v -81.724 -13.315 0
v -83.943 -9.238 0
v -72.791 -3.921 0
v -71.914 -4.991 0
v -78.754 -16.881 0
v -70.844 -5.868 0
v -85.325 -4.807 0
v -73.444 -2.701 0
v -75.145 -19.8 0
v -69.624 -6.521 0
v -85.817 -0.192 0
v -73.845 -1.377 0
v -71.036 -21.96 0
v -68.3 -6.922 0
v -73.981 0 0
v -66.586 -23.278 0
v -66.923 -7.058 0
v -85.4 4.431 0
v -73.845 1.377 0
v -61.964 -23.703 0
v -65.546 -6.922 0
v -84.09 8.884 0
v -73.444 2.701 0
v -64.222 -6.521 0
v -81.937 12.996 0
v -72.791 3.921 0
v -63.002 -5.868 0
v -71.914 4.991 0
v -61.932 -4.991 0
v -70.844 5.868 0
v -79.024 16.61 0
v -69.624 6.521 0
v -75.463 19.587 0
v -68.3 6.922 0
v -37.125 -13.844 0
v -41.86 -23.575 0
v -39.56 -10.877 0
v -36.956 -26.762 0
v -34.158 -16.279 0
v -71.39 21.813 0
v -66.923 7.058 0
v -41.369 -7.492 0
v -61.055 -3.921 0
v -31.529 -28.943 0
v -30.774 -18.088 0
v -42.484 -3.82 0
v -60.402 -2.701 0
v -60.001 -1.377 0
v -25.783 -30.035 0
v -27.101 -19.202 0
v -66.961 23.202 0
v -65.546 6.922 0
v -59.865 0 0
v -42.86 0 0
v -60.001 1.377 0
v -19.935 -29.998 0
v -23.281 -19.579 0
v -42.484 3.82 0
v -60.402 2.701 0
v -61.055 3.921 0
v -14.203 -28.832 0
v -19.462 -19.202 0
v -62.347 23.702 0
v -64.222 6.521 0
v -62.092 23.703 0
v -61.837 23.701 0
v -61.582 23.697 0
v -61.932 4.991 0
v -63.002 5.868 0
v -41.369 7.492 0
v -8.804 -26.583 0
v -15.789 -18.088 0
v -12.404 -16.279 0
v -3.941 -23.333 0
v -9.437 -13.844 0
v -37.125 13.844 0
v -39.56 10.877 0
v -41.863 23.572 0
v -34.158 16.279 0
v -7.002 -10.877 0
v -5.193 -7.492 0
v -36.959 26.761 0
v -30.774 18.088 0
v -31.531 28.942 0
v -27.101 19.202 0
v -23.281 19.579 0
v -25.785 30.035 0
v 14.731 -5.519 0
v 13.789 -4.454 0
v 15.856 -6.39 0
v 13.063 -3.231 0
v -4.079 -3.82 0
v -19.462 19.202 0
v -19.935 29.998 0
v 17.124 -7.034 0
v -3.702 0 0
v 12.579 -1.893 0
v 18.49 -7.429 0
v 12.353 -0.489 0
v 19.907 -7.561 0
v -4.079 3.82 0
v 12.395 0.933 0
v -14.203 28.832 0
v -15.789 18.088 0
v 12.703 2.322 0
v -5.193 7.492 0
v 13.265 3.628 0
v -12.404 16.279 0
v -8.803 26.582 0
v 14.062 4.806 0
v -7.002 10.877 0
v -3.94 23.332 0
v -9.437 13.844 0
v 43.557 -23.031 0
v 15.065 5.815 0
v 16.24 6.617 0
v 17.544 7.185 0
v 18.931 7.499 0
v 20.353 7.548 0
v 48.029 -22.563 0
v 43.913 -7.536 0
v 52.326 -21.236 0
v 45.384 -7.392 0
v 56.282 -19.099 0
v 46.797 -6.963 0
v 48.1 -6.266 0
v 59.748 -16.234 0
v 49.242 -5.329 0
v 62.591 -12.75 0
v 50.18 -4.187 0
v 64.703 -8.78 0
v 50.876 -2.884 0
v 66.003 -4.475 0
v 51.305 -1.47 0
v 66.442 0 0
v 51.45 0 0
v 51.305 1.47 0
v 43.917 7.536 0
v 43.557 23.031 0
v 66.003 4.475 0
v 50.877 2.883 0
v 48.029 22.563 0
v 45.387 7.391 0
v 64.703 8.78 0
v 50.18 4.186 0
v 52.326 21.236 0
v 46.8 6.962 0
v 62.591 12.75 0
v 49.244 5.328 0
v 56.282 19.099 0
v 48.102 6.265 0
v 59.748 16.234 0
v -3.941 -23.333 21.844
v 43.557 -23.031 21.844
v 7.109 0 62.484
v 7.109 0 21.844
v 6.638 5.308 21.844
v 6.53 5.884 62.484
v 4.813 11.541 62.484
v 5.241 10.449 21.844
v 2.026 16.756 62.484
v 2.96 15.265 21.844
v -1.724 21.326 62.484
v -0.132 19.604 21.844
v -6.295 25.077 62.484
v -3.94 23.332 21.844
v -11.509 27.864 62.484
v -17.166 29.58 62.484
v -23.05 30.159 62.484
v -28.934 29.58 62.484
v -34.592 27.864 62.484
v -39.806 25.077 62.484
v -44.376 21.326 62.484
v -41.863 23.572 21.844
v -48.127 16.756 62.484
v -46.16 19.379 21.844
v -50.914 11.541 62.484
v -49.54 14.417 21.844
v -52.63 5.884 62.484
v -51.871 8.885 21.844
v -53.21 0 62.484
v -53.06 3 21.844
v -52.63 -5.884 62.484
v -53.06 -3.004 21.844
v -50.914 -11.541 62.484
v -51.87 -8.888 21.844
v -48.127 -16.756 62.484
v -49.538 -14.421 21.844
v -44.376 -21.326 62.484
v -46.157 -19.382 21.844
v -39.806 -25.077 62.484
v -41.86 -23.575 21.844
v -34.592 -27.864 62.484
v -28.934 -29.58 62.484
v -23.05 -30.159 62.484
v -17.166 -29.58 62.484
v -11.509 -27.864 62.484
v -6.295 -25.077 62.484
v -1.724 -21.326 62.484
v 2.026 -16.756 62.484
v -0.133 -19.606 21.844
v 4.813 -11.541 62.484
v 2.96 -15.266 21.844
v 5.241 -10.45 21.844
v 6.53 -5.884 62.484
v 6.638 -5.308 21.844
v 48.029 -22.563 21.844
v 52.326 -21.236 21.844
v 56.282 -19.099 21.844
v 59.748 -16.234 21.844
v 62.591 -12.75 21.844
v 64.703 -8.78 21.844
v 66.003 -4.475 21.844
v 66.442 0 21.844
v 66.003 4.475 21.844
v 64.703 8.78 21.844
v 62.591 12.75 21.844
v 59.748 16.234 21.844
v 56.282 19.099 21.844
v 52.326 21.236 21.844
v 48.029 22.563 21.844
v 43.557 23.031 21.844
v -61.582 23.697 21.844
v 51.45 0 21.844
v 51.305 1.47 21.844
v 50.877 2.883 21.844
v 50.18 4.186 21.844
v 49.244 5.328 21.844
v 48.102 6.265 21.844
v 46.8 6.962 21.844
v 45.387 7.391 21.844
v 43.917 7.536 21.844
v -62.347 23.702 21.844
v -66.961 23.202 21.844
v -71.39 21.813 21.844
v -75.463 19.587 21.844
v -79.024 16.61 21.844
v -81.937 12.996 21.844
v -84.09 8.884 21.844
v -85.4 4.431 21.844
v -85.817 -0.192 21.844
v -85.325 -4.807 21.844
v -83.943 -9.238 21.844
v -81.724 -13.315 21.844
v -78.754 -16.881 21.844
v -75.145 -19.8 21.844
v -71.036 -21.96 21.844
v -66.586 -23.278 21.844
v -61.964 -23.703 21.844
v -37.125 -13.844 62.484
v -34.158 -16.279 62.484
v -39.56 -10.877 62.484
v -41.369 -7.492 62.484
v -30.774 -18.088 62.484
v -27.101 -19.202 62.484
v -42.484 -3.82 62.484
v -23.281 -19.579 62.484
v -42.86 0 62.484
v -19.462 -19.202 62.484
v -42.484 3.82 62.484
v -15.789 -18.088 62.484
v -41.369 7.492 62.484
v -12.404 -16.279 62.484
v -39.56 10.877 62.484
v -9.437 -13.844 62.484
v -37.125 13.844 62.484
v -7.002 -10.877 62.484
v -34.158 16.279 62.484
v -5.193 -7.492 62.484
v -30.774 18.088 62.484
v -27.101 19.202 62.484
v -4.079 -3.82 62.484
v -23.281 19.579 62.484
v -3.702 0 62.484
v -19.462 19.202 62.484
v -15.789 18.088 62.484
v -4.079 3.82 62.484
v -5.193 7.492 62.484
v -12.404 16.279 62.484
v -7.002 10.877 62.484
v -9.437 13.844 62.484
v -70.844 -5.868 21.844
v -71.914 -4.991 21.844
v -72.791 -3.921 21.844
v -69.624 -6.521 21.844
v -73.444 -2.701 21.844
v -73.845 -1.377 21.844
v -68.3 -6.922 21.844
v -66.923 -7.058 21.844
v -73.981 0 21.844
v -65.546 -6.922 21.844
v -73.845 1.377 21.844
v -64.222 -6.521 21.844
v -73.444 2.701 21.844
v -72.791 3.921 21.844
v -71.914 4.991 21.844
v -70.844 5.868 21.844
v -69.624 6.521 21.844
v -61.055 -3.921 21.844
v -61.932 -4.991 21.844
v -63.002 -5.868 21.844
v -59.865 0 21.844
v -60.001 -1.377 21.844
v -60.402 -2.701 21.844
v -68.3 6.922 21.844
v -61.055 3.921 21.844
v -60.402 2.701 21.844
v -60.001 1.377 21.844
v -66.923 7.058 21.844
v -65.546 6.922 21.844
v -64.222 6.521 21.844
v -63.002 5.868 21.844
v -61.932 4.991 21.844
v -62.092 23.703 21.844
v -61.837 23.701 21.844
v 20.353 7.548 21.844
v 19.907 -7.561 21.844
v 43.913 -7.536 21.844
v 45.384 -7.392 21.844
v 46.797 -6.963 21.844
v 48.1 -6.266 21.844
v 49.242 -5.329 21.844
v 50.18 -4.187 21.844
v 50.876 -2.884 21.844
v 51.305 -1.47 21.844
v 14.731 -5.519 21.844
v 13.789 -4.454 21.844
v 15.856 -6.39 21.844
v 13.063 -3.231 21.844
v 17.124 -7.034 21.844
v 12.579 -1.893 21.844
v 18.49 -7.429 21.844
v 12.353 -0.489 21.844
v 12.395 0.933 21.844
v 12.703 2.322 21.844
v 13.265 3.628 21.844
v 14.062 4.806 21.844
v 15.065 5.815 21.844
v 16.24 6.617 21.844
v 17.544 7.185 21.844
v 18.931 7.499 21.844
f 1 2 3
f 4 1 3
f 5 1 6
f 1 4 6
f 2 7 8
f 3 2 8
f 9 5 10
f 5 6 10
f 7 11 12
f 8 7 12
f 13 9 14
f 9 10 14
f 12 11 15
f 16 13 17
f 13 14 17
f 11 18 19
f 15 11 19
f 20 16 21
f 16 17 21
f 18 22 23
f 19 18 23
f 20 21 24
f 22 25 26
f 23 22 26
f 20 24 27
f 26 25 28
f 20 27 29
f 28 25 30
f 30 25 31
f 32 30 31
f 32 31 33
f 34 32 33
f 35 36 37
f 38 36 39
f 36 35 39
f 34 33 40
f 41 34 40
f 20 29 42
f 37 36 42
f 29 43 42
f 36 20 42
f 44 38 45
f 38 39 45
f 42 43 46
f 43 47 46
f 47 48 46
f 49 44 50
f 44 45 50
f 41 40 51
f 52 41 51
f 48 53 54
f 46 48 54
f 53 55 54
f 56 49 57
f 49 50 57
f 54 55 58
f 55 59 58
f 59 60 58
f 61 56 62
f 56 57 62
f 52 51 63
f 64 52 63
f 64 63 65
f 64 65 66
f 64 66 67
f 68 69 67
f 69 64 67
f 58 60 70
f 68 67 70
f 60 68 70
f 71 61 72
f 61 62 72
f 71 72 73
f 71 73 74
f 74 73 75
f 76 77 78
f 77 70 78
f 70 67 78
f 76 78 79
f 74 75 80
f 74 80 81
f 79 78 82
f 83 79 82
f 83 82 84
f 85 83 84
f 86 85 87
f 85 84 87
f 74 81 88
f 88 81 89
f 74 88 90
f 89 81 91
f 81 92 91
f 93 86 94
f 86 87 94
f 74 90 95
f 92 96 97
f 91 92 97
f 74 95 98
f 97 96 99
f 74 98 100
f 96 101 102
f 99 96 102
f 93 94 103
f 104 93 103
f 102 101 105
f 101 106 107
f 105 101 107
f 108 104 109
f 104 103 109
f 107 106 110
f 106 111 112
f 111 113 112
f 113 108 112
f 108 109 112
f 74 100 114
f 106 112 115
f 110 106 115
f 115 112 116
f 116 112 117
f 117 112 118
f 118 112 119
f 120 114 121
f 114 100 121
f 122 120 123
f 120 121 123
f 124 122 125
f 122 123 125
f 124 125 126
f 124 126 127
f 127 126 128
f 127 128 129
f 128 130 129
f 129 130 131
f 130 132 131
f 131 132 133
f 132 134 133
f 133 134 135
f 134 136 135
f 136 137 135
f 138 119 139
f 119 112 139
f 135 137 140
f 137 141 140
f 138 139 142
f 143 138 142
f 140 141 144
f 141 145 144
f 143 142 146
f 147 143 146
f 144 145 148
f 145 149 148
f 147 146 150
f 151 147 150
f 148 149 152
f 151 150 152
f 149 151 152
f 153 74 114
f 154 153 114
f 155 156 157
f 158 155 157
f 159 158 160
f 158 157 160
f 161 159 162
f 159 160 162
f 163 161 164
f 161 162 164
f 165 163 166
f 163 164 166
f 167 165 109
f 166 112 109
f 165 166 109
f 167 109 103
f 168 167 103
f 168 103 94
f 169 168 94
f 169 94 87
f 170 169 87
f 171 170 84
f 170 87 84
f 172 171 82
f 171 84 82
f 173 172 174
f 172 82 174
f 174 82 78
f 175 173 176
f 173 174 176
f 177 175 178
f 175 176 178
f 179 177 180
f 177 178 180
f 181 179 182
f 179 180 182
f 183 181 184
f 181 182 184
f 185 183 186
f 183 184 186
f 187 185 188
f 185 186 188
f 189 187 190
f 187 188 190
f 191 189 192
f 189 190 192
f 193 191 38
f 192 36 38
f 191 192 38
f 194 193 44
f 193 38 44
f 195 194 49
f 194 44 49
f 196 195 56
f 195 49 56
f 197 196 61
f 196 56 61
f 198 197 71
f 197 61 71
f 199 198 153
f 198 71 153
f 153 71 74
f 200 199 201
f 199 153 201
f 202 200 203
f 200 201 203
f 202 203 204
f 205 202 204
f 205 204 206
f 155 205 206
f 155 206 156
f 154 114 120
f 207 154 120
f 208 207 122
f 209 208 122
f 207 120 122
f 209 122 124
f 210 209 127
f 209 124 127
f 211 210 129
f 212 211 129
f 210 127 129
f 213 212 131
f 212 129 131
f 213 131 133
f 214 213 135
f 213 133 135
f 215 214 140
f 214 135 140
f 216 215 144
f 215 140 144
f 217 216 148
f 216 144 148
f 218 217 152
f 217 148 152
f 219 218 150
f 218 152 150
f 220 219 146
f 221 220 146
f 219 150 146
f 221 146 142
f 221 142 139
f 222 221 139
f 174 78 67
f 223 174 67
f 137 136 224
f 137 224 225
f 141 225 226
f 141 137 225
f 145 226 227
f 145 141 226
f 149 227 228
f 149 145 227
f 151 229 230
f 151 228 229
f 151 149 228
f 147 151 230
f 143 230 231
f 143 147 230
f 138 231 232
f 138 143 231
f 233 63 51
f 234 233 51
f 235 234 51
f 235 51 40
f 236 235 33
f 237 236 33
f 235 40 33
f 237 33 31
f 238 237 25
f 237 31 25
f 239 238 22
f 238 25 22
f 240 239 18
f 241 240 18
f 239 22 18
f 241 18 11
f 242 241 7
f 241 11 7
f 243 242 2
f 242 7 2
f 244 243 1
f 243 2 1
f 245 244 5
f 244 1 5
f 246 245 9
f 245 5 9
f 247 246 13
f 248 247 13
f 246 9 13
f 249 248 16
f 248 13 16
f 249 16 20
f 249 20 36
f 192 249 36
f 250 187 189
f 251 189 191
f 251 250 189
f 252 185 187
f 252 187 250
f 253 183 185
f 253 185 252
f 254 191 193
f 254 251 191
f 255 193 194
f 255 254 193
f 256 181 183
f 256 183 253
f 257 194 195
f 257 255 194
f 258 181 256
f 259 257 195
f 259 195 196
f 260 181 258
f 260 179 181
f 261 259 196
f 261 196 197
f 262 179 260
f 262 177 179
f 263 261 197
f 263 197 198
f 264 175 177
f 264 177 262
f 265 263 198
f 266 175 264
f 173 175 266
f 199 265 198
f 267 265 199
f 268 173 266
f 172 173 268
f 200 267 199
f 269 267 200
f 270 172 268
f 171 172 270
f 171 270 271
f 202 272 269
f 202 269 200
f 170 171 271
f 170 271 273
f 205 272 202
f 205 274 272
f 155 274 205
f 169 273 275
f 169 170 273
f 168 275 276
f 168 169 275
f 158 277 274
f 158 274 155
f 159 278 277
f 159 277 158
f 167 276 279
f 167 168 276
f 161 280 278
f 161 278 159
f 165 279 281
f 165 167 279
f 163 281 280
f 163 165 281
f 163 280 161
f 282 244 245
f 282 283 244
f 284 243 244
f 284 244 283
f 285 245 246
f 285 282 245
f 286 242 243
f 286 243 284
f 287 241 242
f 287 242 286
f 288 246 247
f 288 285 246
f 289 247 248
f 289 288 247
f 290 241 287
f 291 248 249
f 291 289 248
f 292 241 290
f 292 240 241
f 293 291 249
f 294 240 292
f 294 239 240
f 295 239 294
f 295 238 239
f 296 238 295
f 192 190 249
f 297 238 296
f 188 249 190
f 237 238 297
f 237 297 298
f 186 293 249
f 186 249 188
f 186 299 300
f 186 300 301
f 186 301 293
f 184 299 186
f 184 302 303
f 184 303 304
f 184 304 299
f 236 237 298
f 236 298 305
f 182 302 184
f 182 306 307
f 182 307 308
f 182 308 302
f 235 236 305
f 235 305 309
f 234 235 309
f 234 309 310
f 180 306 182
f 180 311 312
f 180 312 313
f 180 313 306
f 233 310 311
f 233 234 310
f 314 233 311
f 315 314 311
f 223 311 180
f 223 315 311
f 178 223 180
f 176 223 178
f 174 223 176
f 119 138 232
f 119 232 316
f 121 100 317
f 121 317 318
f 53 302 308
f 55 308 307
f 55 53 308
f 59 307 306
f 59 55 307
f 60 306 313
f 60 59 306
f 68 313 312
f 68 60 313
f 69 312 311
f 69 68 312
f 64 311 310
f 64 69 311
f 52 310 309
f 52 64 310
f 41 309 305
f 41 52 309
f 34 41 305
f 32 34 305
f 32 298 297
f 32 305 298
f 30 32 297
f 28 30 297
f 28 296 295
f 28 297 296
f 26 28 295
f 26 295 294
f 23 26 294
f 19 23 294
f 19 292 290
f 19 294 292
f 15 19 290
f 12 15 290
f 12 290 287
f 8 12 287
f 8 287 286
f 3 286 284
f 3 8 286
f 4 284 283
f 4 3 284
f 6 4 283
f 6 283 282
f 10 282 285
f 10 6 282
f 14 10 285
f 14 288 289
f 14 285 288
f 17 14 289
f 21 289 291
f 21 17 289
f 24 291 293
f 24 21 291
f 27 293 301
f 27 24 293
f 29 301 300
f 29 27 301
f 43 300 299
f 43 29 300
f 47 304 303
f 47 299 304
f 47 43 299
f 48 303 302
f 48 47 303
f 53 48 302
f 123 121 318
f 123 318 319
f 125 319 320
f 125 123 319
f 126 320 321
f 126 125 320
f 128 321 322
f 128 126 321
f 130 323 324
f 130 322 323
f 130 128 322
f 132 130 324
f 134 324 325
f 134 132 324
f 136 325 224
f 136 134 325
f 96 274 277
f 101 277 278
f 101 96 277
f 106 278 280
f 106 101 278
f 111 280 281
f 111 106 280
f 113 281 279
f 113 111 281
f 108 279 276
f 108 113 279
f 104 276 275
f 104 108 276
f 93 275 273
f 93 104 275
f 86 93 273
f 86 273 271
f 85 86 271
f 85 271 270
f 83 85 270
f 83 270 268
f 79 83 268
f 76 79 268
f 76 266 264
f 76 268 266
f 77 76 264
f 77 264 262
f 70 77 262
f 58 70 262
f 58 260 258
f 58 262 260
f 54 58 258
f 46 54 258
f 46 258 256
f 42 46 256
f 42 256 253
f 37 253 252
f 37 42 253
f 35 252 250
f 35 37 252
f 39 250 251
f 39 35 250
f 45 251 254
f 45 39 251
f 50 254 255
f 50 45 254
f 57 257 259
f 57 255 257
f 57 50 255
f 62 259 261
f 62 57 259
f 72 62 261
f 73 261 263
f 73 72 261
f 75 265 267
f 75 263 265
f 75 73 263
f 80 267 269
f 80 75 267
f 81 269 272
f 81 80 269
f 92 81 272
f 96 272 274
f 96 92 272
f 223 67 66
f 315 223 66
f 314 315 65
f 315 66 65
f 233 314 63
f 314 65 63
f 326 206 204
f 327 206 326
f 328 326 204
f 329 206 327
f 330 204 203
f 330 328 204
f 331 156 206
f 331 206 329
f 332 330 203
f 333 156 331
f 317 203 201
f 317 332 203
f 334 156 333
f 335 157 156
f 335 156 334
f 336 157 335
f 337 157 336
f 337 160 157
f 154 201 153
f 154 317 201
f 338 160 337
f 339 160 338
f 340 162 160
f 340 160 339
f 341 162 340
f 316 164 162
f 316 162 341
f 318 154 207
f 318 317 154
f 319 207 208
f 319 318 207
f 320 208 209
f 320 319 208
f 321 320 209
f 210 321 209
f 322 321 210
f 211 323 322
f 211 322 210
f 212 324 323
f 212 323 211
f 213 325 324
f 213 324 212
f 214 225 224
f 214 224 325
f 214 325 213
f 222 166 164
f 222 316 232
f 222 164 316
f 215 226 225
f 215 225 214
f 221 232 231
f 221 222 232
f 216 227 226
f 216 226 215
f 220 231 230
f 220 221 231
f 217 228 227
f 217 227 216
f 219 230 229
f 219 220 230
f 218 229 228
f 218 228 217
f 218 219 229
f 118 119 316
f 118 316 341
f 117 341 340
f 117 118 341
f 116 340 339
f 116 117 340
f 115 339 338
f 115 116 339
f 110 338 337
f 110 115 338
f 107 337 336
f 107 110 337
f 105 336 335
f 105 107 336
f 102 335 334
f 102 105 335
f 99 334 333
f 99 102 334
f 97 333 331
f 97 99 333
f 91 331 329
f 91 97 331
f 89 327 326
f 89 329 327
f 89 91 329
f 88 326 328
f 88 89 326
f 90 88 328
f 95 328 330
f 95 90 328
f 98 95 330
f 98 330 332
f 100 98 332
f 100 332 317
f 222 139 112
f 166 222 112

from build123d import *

# Parameters (mm, degrees)
F1_DEPTH = 21.844
F2_R     = 30.1592813174
F3_DEPTH = 62.484
F4_R     = 19.5786544463
F5_DEPTH = 62.738
F7_DEPTH = 23.876
F8_R     = 7.0578530297
F9_DEPTH = 33.02


with BuildPart() as f1:
    # F0 (on Top) → F1 (new body)
    with BuildSketch(Plane.XY):
        with BuildLine():
            Line((-62.3466224072, 23.7019382979), (-61.5820136192, 23.6970914847))
            ThreePointArc((-61.5820136192, 23.6970914847), (-61.9642984681, 23.7025982274), (-62.3466224072, 23.7019382979))
        make_face()
        with BuildLine():
            Line((-41.3086953744, 23.5685800324), (-61.5820136192, 23.6970914847))
            Line((-61.5820136192, 23.6970914847), (-62.3466224072, 23.7019382979))
            ThreePointArc((-62.3466224072, 23.7019382979), (-85.8168487149, -0.1915085468), (-61.9636058746, -23.702593827))
            Line((-61.9636058746, -23.702593827), (-41.3055604078, -23.5710399543))
            ThreePointArc((-41.3055604078, -23.5710399543), (-52.7722777928, -0.0019924377), (-41.3086953744, 23.5685800324))
        make_face()
        with BuildLine():
            ThreePointArc((-4.0190974569, 23.3322033166), (-22.6226378881, 29.9591287907), (-41.3086953744, 23.5685800324))
            Line((-41.3086953744, 23.5685800324), (-4.0190974569, 23.3322033166))
        make_face()
        with BuildLine():
            Line((-4.0190974569, 23.3322033166), (-41.3086953744, 23.5685800324))
            ThreePointArc((-41.3086953744, 23.5685800324), (-52.7722777928, -0.0019924377), (-41.3055604078, -23.5710399543))
            Line((-41.3055604078, -23.5710399543), (-4.020837331, -23.3336046305))
            ThreePointArc((-4.020837331, -23.3336046305), (4.211331439, -12.9342741883), (7.1471835347, 0))
            ThreePointArc((7.1471835347, 0), (4.2118136579, 12.933266629), (-4.0190974569, 23.3322033166))
        make_face()
        with BuildLine():
            Line((43.5569020036, 23.0306216657), (-4.0190974569, 23.3322033166))
            ThreePointArc((-4.0190974569, 23.3322033166), (4.2118136579, 12.933266629), (7.1471835347, 0))
            ThreePointArc((7.1471835347, 0), (4.211331439, -12.9342741883), (-4.020837331, -23.3336046305))
            Line((-4.020837331, -23.3336046305), (43.5569020036, -23.0306216657))
            ThreePointArc((43.5569020036, -23.0306216657), (66.4419965279, 0), (43.5569020036, 23.0306216657))
        make_face()
        with BuildLine():
            Line((-4.020837331, -23.3336046305), (-41.3055604078, -23.5710399543))
            ThreePointArc((-41.3055604078, -23.5710399543), (-22.6217624778, -29.9591232288), (-4.020837331, -23.3336046305))
        make_face()
    extrude(amount=F1_DEPTH)

    # F2 (on Top) → F3 (join)
    with BuildSketch(Plane.XY):
        with Locations((-23.0502411723, 0)):
            Circle(F2_R)
    extrude(amount=F3_DEPTH)

    # F4 (on Top) → F5 (cut)
    with BuildSketch(Plane.XY):
        with Locations((-23.2811495662, 0)):
            Circle(F4_R)
    extrude(amount=F5_DEPTH, mode=Mode.SUBTRACT)

    # F6 (on Top) → F7 (cut)
    with BuildSketch(Plane.XY):
        with BuildLine():
            ThreePointArc((43.913397938, -7.536449256), (49.242472313, -5.329074375), (51.449847194, 0))
            ThreePointArc((51.449847194, 0), (49.2437269469, 5.3278194456), (43.9169469964, 7.5364484203))
            Line((43.9169469964, 7.5364484203), (43.913397938, -7.536449256))
        make_face()
        with BuildLine():
            Line((43.913397938, -7.536449256), (43.9169469964, 7.5364484203))
            ThreePointArc((43.9169469964, 7.5364484203), (36.3769488909, 0.0017745292), (43.913397938, -7.536449256))
        make_face()
        with BuildLine():
            ThreePointArc((43.913397938, -7.536449256), (36.3769488909, 0.0017745292), (43.9169469964, 7.5364484203))
            Line((43.9169469964, 7.5364484203), (20.3525681334, 7.5475453391))
            ThreePointArc((20.3525681334, 7.5475453391), (25.4034820207, 5.1836600837), (27.4600210391, 0))
            ThreePointArc((27.4600210391, 0), (25.2481571439, -5.3438018752), (19.9066354296, -7.5611665607))
            Line((19.9066354296, -7.5611665607), (43.913397938, -7.536449256))
        make_face()
        with BuildLine():
            ThreePointArc((27.4600210391, 0), (25.4034820207, 5.1836600837), (20.3525681334, 7.5475453391))
            ThreePointArc((20.3525681334, 7.5475453391), (12.3409711396, 0.2230703443), (19.9066354296, -7.5611665607))
            ThreePointArc((19.9066354296, -7.5611665607), (25.2481571439, -5.3438018752), (27.4600210391, 0))
        make_face()
    extrude(amount=F7_DEPTH, mode=Mode.SUBTRACT)

    # F8 (on Top) → F9 (cut)
    with BuildSketch(Plane.XY):
        with Locations((-66.9229701161, 0)):
            Circle(F8_R)
    extrude(amount=F9_DEPTH, mode=Mode.SUBTRACT)


solid = f1.part
